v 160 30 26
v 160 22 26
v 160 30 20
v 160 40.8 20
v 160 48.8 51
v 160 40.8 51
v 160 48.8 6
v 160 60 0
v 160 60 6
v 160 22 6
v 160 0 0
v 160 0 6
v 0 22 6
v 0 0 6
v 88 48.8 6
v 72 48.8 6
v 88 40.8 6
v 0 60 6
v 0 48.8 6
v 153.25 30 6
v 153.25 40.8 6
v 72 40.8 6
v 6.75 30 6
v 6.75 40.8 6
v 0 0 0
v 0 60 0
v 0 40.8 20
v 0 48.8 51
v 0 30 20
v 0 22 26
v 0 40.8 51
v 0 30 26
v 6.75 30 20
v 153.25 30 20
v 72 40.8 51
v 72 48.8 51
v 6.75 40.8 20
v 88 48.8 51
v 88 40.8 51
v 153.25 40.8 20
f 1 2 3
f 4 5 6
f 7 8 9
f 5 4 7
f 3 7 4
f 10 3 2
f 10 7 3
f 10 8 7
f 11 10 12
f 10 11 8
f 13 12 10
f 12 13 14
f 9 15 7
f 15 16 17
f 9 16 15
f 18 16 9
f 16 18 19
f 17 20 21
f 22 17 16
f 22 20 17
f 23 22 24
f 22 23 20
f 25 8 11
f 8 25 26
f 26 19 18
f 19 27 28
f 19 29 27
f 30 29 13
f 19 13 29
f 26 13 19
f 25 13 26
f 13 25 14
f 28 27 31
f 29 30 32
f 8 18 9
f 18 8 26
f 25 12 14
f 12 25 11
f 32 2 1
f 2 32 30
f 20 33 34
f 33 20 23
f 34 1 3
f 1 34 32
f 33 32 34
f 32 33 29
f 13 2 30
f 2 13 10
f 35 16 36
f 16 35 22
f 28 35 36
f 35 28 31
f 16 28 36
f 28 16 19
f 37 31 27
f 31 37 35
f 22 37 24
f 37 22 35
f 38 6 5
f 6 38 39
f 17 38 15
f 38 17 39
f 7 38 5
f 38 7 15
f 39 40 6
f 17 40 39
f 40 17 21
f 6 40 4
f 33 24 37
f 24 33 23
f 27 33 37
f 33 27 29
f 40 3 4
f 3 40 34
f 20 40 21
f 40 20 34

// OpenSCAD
// Apple HomeView (Wall Mounted model) counter cradle, v0 loose fit.
// Published numbers only (Apple tech specs, Oct 13 2026): 145.5 x 145.5 x 9.8 mm, 286 g.
// Purpose: stand the mount-less wall unit upright on a counter or shelf, powered by its
// own USB-C cable, until Apple's magnet layout is known and a fitted mount can be made.
// Not an Apple product. Revise after units ship on Nov 13 2026.

device_w   = 145.5;  // width, mm
device_t   = 9.8;    // thickness, mm
clearance  = 1.0;    // slot clearance, mm (tighten to 0.6 after a fit test)
base_w     = 160;    // cradle width
base_d     = 60;     // cradle depth
base_h     = 6;      // base thickness
front_lip_h = 20;    // front lip height above base
back_lip_h  = 45;    // back lip height above base
lip_t      = 8;      // lip thickness
front_y    = 22;     // where the front lip starts (from the front edge)
notch_w    = 16;     // cable notch in the back lip, for a USB-C plug
side_stop_h = 14;    // small blocks that centre the device

slot_w = device_t + clearance;
slot_y = front_y + lip_t;
back_y = slot_y + slot_w;

module box(x, y, z, w, d, h) { translate([x, y, z]) cube([w, d, h]); }

union() {
  box(0, 0, 0, base_w, base_d, base_h);                               // base
  box(0, front_y, base_h, base_w, lip_t, front_lip_h);                 // front lip
  box(0, back_y, base_h, (base_w - notch_w) / 2, lip_t, back_lip_h);   // back lip, left
  box((base_w + notch_w) / 2, back_y, base_h, (base_w - notch_w) / 2, lip_t, back_lip_h); // back lip, right
  box(0, slot_y, base_h, (base_w - device_w - clearance) / 2, slot_w, side_stop_h);               // left stop
  box((base_w + device_w + clearance) / 2, slot_y, base_h, (base_w - device_w - clearance) / 2, slot_w, side_stop_h); // right stop
}
